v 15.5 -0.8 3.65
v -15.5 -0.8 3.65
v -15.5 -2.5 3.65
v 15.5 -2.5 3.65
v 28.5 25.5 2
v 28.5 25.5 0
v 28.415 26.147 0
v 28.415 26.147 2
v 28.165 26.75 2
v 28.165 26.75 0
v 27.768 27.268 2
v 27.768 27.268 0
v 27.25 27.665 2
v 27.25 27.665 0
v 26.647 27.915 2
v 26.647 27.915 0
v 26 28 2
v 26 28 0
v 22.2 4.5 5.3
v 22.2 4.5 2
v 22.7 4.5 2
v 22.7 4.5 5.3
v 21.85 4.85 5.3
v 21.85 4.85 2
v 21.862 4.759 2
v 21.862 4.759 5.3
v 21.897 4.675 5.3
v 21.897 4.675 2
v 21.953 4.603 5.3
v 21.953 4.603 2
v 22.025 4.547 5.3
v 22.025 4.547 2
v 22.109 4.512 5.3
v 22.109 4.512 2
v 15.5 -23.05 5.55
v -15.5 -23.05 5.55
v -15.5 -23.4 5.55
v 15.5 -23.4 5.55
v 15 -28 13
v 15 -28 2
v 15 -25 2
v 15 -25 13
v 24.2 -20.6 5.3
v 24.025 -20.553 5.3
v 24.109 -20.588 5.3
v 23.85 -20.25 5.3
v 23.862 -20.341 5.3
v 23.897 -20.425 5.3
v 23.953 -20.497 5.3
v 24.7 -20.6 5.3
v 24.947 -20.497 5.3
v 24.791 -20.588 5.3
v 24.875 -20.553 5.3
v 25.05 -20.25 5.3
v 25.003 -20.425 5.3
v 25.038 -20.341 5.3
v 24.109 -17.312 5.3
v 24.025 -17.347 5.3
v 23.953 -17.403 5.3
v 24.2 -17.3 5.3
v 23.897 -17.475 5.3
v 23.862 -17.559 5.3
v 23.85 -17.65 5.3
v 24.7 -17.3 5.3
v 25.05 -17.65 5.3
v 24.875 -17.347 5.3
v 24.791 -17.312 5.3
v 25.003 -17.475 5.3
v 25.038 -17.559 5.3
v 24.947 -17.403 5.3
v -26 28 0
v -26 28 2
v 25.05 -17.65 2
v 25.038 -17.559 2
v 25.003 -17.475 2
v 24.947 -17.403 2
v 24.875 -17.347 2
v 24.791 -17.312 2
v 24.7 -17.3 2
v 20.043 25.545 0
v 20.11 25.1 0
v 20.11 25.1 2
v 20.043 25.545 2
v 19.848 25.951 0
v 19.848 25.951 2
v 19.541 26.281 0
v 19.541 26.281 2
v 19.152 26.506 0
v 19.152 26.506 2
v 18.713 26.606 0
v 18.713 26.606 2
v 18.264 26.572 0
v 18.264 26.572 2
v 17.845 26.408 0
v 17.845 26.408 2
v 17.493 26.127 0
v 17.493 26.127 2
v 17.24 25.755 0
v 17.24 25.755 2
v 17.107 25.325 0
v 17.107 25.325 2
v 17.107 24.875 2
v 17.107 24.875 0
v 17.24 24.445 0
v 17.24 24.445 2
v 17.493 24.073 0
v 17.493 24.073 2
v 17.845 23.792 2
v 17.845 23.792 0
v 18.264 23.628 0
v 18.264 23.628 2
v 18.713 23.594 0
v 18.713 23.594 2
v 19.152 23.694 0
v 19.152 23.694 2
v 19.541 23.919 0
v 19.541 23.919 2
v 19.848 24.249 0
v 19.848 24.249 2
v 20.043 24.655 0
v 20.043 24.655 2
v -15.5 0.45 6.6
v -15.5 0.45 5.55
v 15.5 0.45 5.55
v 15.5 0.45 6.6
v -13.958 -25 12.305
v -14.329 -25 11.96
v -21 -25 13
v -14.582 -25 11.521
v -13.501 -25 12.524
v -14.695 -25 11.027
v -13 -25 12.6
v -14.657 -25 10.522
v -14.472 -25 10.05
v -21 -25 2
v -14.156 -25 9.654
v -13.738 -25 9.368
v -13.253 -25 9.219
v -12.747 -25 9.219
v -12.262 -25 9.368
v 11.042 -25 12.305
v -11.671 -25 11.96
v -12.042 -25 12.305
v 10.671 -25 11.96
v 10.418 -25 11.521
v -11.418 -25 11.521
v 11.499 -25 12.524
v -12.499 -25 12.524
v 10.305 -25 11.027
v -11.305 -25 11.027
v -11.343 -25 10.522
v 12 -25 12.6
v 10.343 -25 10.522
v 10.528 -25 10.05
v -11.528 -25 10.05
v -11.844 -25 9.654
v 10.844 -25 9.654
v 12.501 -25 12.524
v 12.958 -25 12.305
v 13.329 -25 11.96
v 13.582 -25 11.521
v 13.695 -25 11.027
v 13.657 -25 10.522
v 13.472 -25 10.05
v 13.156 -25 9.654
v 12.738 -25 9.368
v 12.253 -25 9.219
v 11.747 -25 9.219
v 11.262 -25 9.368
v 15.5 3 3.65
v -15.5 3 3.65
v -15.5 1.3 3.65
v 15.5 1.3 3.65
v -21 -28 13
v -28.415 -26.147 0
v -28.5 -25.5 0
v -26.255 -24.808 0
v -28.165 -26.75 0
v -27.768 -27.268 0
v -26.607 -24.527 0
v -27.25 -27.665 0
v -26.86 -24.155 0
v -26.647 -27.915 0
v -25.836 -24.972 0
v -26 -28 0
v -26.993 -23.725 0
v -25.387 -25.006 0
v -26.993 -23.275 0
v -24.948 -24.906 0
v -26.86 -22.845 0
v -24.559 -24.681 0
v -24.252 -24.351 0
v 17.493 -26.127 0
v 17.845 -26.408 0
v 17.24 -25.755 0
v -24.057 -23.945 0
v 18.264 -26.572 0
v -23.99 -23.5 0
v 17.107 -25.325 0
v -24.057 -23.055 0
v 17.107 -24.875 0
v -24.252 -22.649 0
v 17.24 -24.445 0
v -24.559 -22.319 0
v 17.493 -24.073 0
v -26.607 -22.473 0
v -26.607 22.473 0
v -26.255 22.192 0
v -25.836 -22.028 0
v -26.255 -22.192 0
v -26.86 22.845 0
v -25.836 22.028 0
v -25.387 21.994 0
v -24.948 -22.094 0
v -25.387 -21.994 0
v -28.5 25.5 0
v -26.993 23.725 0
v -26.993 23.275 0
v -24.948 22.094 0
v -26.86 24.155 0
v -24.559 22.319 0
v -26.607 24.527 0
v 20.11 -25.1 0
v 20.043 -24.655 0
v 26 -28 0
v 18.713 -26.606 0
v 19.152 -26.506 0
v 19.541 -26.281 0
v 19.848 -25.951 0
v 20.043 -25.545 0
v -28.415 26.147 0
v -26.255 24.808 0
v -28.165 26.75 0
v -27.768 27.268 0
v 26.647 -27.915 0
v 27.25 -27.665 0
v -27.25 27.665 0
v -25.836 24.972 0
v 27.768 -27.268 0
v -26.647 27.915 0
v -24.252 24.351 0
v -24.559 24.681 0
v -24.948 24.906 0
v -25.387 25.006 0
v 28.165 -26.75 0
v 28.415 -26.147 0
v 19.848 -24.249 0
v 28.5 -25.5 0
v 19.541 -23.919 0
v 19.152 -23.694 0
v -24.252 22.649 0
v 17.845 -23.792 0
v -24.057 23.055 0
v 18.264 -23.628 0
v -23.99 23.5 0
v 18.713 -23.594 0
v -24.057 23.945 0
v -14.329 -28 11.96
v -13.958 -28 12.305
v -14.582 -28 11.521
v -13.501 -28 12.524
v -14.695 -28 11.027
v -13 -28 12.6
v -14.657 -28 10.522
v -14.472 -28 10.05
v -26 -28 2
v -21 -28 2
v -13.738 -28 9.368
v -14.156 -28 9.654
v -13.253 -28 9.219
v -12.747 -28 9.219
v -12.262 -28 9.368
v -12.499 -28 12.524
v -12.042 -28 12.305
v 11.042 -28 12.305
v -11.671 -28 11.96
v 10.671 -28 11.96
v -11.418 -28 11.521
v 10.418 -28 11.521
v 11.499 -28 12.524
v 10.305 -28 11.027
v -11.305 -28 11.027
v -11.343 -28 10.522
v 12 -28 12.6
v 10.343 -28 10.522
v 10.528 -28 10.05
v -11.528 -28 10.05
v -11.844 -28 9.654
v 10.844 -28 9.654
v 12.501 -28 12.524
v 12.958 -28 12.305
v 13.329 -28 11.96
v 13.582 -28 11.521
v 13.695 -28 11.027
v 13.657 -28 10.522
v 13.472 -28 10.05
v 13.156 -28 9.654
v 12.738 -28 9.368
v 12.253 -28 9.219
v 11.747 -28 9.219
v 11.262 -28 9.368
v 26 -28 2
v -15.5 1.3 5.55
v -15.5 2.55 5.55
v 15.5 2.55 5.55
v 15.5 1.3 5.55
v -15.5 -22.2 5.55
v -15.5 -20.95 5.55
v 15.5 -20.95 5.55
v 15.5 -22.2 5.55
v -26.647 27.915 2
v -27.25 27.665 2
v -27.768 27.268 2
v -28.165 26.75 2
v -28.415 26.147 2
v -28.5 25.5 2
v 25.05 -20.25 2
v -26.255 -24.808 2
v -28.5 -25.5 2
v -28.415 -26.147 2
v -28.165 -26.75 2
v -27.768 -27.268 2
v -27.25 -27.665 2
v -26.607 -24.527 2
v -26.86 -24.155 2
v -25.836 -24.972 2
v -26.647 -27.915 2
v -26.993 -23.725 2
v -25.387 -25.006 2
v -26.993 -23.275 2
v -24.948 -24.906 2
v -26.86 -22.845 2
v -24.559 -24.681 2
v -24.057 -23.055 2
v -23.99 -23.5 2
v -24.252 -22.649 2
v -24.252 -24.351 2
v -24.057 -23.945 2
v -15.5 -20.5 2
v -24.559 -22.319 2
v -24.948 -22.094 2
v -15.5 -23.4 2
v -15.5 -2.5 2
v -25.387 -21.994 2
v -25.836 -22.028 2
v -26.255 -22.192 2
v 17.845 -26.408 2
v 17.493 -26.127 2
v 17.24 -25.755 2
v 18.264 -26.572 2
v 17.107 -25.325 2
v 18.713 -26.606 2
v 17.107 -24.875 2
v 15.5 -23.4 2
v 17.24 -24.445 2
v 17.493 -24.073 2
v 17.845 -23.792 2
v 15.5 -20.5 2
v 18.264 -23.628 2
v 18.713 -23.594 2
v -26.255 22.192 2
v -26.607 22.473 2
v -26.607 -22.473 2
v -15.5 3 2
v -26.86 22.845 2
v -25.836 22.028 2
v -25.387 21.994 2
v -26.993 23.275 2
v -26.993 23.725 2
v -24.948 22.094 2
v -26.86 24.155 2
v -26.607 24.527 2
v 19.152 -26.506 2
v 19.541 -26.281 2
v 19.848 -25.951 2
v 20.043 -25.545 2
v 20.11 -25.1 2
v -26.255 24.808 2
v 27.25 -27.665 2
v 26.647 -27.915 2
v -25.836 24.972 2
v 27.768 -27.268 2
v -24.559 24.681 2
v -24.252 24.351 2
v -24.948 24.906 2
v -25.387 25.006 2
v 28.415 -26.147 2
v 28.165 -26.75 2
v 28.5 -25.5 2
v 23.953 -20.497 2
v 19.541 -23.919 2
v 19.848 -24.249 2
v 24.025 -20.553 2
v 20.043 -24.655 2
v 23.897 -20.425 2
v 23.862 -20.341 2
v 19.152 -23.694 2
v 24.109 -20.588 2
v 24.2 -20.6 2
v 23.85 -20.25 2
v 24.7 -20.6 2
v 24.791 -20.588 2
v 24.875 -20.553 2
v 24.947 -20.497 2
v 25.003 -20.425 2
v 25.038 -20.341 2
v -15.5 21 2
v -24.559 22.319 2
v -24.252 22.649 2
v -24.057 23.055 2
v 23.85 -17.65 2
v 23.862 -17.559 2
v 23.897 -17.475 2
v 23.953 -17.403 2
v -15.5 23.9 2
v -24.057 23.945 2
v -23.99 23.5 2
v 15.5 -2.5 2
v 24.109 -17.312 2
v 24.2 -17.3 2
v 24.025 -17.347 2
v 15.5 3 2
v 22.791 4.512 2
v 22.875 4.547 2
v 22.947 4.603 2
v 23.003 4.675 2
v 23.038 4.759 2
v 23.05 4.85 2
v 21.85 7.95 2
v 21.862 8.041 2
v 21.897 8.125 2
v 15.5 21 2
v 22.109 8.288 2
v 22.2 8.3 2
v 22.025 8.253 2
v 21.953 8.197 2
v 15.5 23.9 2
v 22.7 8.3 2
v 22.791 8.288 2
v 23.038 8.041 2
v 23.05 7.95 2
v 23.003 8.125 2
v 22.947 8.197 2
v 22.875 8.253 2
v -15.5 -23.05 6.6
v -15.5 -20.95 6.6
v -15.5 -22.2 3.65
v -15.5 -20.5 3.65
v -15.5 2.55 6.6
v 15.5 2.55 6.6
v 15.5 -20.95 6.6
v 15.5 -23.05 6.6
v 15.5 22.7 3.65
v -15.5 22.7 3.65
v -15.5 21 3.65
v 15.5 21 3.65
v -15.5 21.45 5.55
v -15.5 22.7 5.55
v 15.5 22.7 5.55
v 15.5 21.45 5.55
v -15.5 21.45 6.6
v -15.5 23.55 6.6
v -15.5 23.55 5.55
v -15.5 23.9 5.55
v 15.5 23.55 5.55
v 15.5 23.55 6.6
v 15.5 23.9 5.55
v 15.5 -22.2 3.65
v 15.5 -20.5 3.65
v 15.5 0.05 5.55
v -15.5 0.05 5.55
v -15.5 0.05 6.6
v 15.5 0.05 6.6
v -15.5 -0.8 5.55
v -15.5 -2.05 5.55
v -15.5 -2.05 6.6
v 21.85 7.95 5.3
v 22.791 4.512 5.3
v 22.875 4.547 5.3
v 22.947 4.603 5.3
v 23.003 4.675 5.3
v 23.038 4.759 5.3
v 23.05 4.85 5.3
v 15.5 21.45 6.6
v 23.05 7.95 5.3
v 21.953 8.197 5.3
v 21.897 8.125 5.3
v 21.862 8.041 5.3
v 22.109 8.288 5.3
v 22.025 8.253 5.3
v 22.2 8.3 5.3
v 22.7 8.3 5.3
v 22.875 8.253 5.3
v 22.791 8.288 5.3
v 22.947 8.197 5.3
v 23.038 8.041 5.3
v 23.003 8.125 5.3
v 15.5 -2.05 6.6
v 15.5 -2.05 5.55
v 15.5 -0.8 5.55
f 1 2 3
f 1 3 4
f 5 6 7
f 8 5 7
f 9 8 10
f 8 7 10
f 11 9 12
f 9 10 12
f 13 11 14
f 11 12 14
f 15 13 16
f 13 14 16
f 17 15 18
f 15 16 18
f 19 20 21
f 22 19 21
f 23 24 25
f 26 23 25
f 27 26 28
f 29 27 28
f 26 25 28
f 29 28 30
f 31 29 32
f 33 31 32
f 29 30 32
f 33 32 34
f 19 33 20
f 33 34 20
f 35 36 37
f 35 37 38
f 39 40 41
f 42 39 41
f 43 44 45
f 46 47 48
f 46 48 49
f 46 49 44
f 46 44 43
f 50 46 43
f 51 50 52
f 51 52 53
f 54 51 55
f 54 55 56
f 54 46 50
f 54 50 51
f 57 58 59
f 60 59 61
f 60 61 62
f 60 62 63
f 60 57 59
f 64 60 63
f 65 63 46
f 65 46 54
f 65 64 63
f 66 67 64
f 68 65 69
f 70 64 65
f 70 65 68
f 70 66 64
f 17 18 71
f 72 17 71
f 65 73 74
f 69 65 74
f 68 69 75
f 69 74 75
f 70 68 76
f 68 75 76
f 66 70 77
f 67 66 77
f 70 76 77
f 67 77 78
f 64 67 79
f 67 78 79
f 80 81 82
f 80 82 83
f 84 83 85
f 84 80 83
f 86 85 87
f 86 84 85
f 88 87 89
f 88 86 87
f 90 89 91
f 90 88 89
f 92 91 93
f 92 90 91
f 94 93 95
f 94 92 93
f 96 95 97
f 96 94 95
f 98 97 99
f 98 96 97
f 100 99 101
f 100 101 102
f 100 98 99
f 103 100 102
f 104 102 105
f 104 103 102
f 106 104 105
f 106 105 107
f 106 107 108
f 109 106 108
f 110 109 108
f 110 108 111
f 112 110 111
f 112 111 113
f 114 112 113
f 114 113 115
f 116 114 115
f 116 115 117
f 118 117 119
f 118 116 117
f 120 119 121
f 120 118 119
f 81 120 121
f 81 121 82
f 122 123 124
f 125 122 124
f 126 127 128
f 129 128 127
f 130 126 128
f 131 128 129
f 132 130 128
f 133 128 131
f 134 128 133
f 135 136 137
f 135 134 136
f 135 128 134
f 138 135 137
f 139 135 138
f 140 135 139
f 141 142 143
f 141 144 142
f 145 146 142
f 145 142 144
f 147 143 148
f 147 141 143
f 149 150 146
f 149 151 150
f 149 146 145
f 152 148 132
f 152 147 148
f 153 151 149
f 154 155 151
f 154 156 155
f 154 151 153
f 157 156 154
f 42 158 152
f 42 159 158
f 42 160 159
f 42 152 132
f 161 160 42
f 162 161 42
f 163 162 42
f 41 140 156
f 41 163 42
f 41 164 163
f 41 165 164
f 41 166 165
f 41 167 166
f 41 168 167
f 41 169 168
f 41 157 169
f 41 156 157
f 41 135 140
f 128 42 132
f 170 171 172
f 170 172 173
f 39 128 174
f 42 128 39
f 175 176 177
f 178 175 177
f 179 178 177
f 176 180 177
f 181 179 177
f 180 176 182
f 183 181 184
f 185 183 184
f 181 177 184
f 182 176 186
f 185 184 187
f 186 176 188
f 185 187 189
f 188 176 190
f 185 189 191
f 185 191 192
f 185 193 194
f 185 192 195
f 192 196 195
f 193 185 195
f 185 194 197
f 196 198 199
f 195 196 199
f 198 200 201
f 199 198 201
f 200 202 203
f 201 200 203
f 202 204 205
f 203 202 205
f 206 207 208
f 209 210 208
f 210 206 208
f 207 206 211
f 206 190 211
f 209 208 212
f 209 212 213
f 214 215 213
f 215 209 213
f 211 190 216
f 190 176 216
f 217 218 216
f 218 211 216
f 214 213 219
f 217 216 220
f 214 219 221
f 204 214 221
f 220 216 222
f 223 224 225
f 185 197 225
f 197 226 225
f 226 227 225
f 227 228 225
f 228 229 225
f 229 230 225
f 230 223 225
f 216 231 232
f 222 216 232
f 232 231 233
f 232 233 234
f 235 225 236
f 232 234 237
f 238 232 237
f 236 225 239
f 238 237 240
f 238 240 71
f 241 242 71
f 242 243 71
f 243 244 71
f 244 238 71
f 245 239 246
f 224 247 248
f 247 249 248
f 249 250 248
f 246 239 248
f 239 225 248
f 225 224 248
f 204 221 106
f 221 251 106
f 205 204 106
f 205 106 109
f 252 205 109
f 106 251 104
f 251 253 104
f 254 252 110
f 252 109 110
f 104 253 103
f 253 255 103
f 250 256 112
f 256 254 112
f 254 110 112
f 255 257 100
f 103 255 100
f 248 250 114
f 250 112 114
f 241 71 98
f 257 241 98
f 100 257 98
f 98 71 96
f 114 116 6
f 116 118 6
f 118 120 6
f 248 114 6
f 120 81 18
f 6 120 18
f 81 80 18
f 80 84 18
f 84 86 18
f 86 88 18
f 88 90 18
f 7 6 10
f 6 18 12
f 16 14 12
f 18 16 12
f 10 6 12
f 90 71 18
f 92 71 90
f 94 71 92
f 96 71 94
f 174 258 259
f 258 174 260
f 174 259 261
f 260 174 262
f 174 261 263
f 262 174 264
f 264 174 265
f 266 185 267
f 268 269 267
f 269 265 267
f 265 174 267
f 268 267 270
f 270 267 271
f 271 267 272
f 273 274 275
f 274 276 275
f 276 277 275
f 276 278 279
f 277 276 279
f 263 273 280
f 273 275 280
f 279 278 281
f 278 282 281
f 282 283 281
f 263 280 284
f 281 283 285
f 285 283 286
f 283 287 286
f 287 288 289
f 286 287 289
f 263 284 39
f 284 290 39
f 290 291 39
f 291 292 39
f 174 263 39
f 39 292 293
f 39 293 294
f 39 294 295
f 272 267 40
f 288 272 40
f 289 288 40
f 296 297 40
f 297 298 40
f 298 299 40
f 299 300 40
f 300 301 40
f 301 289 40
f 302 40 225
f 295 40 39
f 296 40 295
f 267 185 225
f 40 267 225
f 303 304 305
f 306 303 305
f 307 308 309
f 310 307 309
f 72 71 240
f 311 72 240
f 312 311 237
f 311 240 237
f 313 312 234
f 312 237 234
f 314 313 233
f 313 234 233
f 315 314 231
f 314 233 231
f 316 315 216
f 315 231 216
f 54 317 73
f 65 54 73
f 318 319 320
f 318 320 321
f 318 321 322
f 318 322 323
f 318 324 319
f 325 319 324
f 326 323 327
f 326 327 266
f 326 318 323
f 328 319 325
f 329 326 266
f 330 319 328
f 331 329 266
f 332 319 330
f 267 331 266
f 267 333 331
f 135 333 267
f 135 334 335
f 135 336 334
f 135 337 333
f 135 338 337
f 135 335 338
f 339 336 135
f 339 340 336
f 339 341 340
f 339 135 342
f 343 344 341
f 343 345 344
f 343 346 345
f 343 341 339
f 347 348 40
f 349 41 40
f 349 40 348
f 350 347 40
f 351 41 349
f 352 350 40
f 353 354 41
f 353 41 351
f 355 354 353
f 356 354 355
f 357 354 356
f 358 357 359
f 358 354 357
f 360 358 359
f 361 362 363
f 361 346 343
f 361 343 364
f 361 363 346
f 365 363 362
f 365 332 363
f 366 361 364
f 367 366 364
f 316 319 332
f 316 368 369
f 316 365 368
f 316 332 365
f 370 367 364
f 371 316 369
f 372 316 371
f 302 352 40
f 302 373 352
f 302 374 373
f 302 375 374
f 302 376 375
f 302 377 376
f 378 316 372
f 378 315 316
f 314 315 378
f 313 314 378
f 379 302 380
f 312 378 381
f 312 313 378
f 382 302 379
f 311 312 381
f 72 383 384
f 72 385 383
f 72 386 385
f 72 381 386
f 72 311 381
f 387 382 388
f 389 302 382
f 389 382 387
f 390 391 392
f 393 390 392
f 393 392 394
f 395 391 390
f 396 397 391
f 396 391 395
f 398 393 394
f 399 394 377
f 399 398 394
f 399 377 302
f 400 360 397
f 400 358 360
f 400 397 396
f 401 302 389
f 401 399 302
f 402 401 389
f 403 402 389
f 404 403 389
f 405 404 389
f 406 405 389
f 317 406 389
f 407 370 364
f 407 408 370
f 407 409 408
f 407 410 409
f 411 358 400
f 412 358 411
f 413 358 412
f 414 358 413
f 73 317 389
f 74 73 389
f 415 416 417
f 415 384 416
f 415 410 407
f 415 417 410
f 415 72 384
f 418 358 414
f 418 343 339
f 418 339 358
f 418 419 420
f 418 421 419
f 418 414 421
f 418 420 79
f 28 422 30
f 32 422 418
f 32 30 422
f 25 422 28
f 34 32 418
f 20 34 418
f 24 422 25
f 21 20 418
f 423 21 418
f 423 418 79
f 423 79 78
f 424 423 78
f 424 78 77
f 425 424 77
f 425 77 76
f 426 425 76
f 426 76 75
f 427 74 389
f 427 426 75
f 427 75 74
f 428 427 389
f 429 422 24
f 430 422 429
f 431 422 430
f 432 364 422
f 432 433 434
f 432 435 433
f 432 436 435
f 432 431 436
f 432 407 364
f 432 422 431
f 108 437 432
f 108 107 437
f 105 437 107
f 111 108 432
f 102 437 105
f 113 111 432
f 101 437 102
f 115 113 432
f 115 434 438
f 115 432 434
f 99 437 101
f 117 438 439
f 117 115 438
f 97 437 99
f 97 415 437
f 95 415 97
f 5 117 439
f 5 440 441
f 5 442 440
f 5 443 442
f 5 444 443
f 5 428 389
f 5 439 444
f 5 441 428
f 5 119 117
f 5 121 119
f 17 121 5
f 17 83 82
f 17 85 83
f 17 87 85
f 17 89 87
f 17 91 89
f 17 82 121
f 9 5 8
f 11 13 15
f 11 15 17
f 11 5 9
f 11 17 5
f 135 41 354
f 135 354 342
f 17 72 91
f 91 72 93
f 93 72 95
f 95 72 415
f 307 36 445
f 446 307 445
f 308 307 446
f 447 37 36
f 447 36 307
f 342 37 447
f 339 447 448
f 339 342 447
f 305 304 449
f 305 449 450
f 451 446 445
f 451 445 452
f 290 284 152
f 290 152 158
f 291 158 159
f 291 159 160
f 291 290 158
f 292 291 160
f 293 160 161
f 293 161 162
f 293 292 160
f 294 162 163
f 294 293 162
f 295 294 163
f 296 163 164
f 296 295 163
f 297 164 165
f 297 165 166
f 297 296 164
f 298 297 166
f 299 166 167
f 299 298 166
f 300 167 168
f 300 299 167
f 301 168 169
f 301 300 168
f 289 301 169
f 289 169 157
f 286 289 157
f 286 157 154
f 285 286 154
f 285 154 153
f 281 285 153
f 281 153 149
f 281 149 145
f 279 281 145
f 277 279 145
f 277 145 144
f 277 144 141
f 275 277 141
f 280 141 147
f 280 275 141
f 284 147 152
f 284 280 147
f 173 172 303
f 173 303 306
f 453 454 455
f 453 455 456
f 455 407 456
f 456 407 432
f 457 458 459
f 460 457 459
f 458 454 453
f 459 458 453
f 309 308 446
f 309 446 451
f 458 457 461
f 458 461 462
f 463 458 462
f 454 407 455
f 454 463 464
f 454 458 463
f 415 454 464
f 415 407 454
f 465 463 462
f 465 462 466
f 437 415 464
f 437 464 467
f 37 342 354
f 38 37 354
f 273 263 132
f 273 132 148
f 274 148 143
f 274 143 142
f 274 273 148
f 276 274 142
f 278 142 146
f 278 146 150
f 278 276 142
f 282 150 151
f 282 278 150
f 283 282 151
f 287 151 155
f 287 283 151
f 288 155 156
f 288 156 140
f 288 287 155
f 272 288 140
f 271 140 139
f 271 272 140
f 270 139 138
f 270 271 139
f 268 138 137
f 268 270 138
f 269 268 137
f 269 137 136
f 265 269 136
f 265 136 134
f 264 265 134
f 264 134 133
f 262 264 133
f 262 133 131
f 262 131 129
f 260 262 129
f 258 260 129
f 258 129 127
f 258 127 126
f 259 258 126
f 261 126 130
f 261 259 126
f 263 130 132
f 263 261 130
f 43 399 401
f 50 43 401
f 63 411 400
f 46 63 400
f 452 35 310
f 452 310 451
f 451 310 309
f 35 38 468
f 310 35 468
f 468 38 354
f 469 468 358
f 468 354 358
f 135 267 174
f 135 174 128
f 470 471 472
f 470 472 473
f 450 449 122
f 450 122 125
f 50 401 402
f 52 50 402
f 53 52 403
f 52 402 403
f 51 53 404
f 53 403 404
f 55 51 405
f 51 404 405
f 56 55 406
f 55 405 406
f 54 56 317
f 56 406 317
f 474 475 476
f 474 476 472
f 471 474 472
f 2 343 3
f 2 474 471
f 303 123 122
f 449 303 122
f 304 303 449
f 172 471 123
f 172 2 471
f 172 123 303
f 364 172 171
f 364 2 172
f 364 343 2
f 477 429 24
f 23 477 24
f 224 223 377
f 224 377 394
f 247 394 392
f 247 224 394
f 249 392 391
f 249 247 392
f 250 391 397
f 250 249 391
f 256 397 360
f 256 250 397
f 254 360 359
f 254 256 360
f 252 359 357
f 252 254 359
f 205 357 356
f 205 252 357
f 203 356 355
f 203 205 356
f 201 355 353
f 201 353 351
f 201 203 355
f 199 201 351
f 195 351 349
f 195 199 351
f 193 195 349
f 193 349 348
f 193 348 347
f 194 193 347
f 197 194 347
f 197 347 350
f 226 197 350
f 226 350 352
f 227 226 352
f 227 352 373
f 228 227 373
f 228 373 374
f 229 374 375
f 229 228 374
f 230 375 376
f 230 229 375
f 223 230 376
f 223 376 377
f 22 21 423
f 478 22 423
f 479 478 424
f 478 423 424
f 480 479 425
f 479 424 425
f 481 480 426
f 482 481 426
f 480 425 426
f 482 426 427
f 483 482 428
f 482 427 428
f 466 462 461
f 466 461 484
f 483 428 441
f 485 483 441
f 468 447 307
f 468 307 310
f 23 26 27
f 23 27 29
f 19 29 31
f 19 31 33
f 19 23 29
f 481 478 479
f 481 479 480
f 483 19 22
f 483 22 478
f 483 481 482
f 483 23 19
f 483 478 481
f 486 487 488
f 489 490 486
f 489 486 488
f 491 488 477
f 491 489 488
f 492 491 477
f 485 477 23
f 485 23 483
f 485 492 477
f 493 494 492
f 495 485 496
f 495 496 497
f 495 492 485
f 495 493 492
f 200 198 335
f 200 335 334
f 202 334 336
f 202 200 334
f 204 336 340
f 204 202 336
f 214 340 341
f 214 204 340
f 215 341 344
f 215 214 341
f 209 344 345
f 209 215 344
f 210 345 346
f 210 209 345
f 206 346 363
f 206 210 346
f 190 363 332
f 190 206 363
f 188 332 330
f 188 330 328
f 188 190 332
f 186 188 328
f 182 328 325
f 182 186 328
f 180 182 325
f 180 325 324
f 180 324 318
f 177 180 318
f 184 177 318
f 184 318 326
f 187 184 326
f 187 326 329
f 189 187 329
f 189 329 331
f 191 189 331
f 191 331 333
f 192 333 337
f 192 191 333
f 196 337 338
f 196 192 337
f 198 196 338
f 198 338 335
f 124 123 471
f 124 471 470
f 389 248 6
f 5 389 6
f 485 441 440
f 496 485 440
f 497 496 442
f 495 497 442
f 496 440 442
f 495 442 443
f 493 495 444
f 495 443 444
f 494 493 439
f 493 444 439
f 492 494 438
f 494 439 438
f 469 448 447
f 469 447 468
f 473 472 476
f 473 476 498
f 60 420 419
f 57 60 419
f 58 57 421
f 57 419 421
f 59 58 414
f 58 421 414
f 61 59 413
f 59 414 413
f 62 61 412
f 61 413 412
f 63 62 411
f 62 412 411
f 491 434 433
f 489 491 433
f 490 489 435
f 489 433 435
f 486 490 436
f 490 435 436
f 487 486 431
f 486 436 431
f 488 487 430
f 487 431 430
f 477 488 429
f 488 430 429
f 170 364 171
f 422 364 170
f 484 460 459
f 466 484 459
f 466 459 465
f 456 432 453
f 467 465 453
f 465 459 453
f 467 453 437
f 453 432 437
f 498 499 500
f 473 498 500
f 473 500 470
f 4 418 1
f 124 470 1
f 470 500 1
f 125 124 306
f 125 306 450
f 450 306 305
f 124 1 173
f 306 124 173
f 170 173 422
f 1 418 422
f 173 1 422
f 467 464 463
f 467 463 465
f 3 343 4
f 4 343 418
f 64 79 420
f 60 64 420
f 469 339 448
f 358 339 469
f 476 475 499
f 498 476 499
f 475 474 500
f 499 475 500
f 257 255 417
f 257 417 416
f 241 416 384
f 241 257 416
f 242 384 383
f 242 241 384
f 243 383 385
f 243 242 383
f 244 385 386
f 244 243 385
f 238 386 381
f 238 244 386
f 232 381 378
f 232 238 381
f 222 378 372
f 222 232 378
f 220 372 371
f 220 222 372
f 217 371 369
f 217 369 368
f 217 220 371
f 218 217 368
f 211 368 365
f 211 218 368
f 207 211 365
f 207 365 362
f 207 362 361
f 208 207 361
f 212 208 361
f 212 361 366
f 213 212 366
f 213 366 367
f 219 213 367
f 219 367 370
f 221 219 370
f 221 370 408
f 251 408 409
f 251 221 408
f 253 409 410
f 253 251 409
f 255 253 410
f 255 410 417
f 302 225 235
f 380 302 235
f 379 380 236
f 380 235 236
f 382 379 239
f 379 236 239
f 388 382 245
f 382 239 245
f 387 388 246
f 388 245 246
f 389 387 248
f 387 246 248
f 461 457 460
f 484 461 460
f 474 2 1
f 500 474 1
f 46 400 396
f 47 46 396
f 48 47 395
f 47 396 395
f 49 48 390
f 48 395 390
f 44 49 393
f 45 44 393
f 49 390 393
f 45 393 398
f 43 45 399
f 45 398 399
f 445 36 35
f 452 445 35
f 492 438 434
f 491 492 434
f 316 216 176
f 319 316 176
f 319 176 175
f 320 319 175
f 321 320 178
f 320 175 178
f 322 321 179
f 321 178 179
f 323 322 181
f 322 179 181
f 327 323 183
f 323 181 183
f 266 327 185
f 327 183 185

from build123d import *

# Parameters (mm, degrees)
VERTICAL_CARRIER_2MM_SKETCH_R  = 1.51
VERTICAL_CARRIER_2MM_DEPTH     = 2
INTEGRAL_FOOT_3MM_START        = 2
INTEGRAL_FOOT_3MM_SKETCH_W     = 36
INTEGRAL_FOOT_3MM_SKETCH_H     = 3
INTEGRAL_FOOT_3MM_DEPTH        = 11
FOOT_2X_D3P4_ISO273_START      = -28
FOOT_2X_D3P4_ISO273_SKETCH_R   = 1.7
FOOT_2X_D3P4_ISO273_DEPTH      = 3
BUCK_UNDERSIDE_RAILS_START     = 2
BUCK_UNDERSIDE_RAILS_SKETCH_W  = 31
BUCK_UNDERSIDE_RAILS_SKETCH_H  = 2
BUCK_UNDERSIDE_RAILS_DEPTH     = 1.65
BUCK_EDGE_GUIDES_START         = 2
BUCK_EDGE_GUIDES_SKETCH_W      = 31
BUCK_EDGE_GUIDES_SKETCH_H      = 1.2
BUCK_EDGE_GUIDES_DEPTH         = 3.55
BUCK_SLIDE_IN_LIPS_START       = 5.55
BUCK_SLIDE_IN_LIPS_SKETCH_W    = 31
BUCK_SLIDE_IN_LIPS_SKETCH_H    = 2.1
BUCK_SLIDE_IN_LIPS_DEPTH       = 1.05
RS485_UNDERSIDE_RAILS_START    = 2
RS485_UNDERSIDE_RAILS_SKETCH_W = 31
RS485_UNDERSIDE_RAILS_SKETCH_H = 2
RS485_UNDERSIDE_RAILS_DEPTH    = 1.65
RS485_EDGE_GUIDES_START        = 2
RS485_EDGE_GUIDES_SKETCH_W     = 31
RS485_EDGE_GUIDES_SKETCH_H     = 1.2
RS485_EDGE_GUIDES_DEPTH        = 3.55
RS485_SLIDE_IN_LIPS_START      = 5.55
RS485_SLIDE_IN_LIPS_SKETCH_W   = 31
RS485_SLIDE_IN_LIPS_SKETCH_H   = 2.1
RS485_SLIDE_IN_LIPS_DEPTH      = 1.05
PCB_INSERTION_STOPS_START      = 2
PCB_INSERTION_STOPS_DEPTH      = 3.3


with BuildPart() as part:
    # Vertical_carrier_2mm_Sketch → Vertical_carrier_2mm (new body)
    with BuildSketch(Plane.XY):
        with BuildLine():
            Line((-26, -28), (26, -28))
            ThreePointArc((26, -28), (27.767766953, -27.267766953), (28.5, -25.5))
            Line((28.5, -25.5), (28.5, 25.5))
            ThreePointArc((28.5, 25.5), (27.767766953, 27.267766953), (26, 28))
            Line((26, 28), (-26, 28))
            ThreePointArc((-26, 28), (-27.767766953, 27.267766953), (-28.5, 25.5))
            Line((-28.5, 25.5), (-28.5, -25.5))
            ThreePointArc((-28.5, -25.5), (-27.767766953, -27.267766953), (-26, -28))
        make_face()
        with Locations((-25.5, -23.5)):
            Circle(VERTICAL_CARRIER_2MM_SKETCH_R, mode=Mode.SUBTRACT)
        with Locations((18.6, -25.1)):
            Circle(VERTICAL_CARRIER_2MM_SKETCH_R, mode=Mode.SUBTRACT)
        with Locations((-25.5, 23.5)):
            Circle(VERTICAL_CARRIER_2MM_SKETCH_R, mode=Mode.SUBTRACT)
        with Locations((18.6, 25.1)):
            Circle(VERTICAL_CARRIER_2MM_SKETCH_R, mode=Mode.SUBTRACT)
    extrude(amount=VERTICAL_CARRIER_2MM_DEPTH)

    # Integral_foot_3mm_Sketch → Integral_foot_3mm (add)
    with BuildSketch(Plane.XY.offset(INTEGRAL_FOOT_3MM_START)):
        with Locations((-3, -26.5)):
            Rectangle(INTEGRAL_FOOT_3MM_SKETCH_W, INTEGRAL_FOOT_3MM_SKETCH_H)
    extrude(amount=INTEGRAL_FOOT_3MM_DEPTH)

    # Foot_2x_D3p4_ISO273_Sketch → Foot_2x_D3p4_ISO273 (cut)
    with BuildSketch(Plane(origin=(0, 0, 0), x_dir=(1, 0, 0), z_dir=(0, 1, 0)).offset(FOOT_2X_D3P4_ISO273_START)):
        with Locations(Location((-13, -10.9, 0), (0, 0, 270))):
            Circle(FOOT_2X_D3P4_ISO273_SKETCH_R)
        with Locations(Location((12, -10.9, 0), (0, 0, 270))):
            Circle(FOOT_2X_D3P4_ISO273_SKETCH_R)
    extrude(amount=FOOT_2X_D3P4_ISO273_DEPTH, mode=Mode.SUBTRACT)

    # Buck_underside_rails_Sketch → Buck_underside_rails (add)
    with BuildSketch(Plane.XY.offset(BUCK_UNDERSIDE_RAILS_START)):
        with Locations((0, 2)):
            Rectangle(BUCK_UNDERSIDE_RAILS_SKETCH_W, BUCK_UNDERSIDE_RAILS_SKETCH_H)
        with Locations((0, 22)):
            Rectangle(BUCK_UNDERSIDE_RAILS_SKETCH_W, BUCK_UNDERSIDE_RAILS_SKETCH_H)
    extrude(amount=BUCK_UNDERSIDE_RAILS_DEPTH)

    # Buck_edge_guides_Sketch → Buck_edge_guides (add)
    with BuildSketch(Plane.XY.offset(BUCK_EDGE_GUIDES_START)):
        with Locations((0, 0.7)):
            Rectangle(BUCK_EDGE_GUIDES_SKETCH_W, BUCK_EDGE_GUIDES_SKETCH_H)
        with Locations((0, 23.3)):
            Rectangle(BUCK_EDGE_GUIDES_SKETCH_W, BUCK_EDGE_GUIDES_SKETCH_H)
    extrude(amount=BUCK_EDGE_GUIDES_DEPTH)

    # Buck_slide_in_lips_Sketch → Buck_slide_in_lips (add)
    with BuildSketch(Plane.XY.offset(BUCK_SLIDE_IN_LIPS_START)):
        with Locations((0, 1.5)):
            Rectangle(BUCK_SLIDE_IN_LIPS_SKETCH_W, BUCK_SLIDE_IN_LIPS_SKETCH_H)
        with Locations((0, 22.5)):
            Rectangle(BUCK_SLIDE_IN_LIPS_SKETCH_W, BUCK_SLIDE_IN_LIPS_SKETCH_H)
    extrude(amount=BUCK_SLIDE_IN_LIPS_DEPTH)

    # RS485_underside_rails_Sketch → RS485_underside_rails (add)
    with BuildSketch(Plane.XY.offset(RS485_UNDERSIDE_RAILS_START)):
        with Locations((0, -21.5)):
            Rectangle(RS485_UNDERSIDE_RAILS_SKETCH_W, RS485_UNDERSIDE_RAILS_SKETCH_H)
        with Locations((0, -1.5)):
            Rectangle(RS485_UNDERSIDE_RAILS_SKETCH_W, RS485_UNDERSIDE_RAILS_SKETCH_H)
    extrude(amount=RS485_UNDERSIDE_RAILS_DEPTH)

    # RS485_edge_guides_Sketch → RS485_edge_guides (add)
    with BuildSketch(Plane.XY.offset(RS485_EDGE_GUIDES_START)):
        with Locations((0, -22.8)):
            Rectangle(RS485_EDGE_GUIDES_SKETCH_W, RS485_EDGE_GUIDES_SKETCH_H)
        with Locations((0, -0.2)):
            Rectangle(RS485_EDGE_GUIDES_SKETCH_W, RS485_EDGE_GUIDES_SKETCH_H)
    extrude(amount=RS485_EDGE_GUIDES_DEPTH)

    # RS485_slide_in_lips_Sketch → RS485_slide_in_lips (add)
    with BuildSketch(Plane.XY.offset(RS485_SLIDE_IN_LIPS_START)):
        with Locations((0, -22)):
            Rectangle(RS485_SLIDE_IN_LIPS_SKETCH_W, RS485_SLIDE_IN_LIPS_SKETCH_H)
        with Locations((0, -1)):
            Rectangle(RS485_SLIDE_IN_LIPS_SKETCH_W, RS485_SLIDE_IN_LIPS_SKETCH_H)
    extrude(amount=RS485_SLIDE_IN_LIPS_DEPTH)

    # PCB_insertion_stops_Sketch → PCB_insertion_stops (add)
    with BuildSketch(Plane.XY.offset(PCB_INSERTION_STOPS_START)):
        with BuildLine():
            Line((22.2, 4.5), (22.7, 4.5))
            ThreePointArc((22.7, 4.5), (22.947487373, 4.602512627), (23.05, 4.85))
            Line((23.05, 4.85), (23.05, 7.95))
            ThreePointArc((23.05, 7.95), (22.947487373, 8.197487373), (22.7, 8.3))
            Line((22.7, 8.3), (22.2, 8.3))
            ThreePointArc((22.2, 8.3), (21.952512627, 8.197487373), (21.85, 7.95))
            Line((21.85, 7.95), (21.85, 4.85))
            ThreePointArc((21.85, 4.85), (21.952512627, 4.602512627), (22.2, 4.5))
        make_face()
        with BuildLine():
            Line((24.2, -20.6), (24.7, -20.6))
            ThreePointArc((24.7, -20.6), (24.947487373, -20.497487373), (25.05, -20.25))
            Line((25.05, -20.25), (25.05, -17.65))
            ThreePointArc((25.05, -17.65), (24.947487373, -17.402512627), (24.7, -17.3))
            Line((24.7, -17.3), (24.2, -17.3))
            ThreePointArc((24.2, -17.3), (23.952512627, -17.402512627), (23.85, -17.65))
            Line((23.85, -17.65), (23.85, -20.25))
            ThreePointArc((23.85, -20.25), (23.952512627, -20.497487373), (24.2, -20.6))
        make_face()
    extrude(amount=PCB_INSERTION_STOPS_DEPTH)


solid = part.part
